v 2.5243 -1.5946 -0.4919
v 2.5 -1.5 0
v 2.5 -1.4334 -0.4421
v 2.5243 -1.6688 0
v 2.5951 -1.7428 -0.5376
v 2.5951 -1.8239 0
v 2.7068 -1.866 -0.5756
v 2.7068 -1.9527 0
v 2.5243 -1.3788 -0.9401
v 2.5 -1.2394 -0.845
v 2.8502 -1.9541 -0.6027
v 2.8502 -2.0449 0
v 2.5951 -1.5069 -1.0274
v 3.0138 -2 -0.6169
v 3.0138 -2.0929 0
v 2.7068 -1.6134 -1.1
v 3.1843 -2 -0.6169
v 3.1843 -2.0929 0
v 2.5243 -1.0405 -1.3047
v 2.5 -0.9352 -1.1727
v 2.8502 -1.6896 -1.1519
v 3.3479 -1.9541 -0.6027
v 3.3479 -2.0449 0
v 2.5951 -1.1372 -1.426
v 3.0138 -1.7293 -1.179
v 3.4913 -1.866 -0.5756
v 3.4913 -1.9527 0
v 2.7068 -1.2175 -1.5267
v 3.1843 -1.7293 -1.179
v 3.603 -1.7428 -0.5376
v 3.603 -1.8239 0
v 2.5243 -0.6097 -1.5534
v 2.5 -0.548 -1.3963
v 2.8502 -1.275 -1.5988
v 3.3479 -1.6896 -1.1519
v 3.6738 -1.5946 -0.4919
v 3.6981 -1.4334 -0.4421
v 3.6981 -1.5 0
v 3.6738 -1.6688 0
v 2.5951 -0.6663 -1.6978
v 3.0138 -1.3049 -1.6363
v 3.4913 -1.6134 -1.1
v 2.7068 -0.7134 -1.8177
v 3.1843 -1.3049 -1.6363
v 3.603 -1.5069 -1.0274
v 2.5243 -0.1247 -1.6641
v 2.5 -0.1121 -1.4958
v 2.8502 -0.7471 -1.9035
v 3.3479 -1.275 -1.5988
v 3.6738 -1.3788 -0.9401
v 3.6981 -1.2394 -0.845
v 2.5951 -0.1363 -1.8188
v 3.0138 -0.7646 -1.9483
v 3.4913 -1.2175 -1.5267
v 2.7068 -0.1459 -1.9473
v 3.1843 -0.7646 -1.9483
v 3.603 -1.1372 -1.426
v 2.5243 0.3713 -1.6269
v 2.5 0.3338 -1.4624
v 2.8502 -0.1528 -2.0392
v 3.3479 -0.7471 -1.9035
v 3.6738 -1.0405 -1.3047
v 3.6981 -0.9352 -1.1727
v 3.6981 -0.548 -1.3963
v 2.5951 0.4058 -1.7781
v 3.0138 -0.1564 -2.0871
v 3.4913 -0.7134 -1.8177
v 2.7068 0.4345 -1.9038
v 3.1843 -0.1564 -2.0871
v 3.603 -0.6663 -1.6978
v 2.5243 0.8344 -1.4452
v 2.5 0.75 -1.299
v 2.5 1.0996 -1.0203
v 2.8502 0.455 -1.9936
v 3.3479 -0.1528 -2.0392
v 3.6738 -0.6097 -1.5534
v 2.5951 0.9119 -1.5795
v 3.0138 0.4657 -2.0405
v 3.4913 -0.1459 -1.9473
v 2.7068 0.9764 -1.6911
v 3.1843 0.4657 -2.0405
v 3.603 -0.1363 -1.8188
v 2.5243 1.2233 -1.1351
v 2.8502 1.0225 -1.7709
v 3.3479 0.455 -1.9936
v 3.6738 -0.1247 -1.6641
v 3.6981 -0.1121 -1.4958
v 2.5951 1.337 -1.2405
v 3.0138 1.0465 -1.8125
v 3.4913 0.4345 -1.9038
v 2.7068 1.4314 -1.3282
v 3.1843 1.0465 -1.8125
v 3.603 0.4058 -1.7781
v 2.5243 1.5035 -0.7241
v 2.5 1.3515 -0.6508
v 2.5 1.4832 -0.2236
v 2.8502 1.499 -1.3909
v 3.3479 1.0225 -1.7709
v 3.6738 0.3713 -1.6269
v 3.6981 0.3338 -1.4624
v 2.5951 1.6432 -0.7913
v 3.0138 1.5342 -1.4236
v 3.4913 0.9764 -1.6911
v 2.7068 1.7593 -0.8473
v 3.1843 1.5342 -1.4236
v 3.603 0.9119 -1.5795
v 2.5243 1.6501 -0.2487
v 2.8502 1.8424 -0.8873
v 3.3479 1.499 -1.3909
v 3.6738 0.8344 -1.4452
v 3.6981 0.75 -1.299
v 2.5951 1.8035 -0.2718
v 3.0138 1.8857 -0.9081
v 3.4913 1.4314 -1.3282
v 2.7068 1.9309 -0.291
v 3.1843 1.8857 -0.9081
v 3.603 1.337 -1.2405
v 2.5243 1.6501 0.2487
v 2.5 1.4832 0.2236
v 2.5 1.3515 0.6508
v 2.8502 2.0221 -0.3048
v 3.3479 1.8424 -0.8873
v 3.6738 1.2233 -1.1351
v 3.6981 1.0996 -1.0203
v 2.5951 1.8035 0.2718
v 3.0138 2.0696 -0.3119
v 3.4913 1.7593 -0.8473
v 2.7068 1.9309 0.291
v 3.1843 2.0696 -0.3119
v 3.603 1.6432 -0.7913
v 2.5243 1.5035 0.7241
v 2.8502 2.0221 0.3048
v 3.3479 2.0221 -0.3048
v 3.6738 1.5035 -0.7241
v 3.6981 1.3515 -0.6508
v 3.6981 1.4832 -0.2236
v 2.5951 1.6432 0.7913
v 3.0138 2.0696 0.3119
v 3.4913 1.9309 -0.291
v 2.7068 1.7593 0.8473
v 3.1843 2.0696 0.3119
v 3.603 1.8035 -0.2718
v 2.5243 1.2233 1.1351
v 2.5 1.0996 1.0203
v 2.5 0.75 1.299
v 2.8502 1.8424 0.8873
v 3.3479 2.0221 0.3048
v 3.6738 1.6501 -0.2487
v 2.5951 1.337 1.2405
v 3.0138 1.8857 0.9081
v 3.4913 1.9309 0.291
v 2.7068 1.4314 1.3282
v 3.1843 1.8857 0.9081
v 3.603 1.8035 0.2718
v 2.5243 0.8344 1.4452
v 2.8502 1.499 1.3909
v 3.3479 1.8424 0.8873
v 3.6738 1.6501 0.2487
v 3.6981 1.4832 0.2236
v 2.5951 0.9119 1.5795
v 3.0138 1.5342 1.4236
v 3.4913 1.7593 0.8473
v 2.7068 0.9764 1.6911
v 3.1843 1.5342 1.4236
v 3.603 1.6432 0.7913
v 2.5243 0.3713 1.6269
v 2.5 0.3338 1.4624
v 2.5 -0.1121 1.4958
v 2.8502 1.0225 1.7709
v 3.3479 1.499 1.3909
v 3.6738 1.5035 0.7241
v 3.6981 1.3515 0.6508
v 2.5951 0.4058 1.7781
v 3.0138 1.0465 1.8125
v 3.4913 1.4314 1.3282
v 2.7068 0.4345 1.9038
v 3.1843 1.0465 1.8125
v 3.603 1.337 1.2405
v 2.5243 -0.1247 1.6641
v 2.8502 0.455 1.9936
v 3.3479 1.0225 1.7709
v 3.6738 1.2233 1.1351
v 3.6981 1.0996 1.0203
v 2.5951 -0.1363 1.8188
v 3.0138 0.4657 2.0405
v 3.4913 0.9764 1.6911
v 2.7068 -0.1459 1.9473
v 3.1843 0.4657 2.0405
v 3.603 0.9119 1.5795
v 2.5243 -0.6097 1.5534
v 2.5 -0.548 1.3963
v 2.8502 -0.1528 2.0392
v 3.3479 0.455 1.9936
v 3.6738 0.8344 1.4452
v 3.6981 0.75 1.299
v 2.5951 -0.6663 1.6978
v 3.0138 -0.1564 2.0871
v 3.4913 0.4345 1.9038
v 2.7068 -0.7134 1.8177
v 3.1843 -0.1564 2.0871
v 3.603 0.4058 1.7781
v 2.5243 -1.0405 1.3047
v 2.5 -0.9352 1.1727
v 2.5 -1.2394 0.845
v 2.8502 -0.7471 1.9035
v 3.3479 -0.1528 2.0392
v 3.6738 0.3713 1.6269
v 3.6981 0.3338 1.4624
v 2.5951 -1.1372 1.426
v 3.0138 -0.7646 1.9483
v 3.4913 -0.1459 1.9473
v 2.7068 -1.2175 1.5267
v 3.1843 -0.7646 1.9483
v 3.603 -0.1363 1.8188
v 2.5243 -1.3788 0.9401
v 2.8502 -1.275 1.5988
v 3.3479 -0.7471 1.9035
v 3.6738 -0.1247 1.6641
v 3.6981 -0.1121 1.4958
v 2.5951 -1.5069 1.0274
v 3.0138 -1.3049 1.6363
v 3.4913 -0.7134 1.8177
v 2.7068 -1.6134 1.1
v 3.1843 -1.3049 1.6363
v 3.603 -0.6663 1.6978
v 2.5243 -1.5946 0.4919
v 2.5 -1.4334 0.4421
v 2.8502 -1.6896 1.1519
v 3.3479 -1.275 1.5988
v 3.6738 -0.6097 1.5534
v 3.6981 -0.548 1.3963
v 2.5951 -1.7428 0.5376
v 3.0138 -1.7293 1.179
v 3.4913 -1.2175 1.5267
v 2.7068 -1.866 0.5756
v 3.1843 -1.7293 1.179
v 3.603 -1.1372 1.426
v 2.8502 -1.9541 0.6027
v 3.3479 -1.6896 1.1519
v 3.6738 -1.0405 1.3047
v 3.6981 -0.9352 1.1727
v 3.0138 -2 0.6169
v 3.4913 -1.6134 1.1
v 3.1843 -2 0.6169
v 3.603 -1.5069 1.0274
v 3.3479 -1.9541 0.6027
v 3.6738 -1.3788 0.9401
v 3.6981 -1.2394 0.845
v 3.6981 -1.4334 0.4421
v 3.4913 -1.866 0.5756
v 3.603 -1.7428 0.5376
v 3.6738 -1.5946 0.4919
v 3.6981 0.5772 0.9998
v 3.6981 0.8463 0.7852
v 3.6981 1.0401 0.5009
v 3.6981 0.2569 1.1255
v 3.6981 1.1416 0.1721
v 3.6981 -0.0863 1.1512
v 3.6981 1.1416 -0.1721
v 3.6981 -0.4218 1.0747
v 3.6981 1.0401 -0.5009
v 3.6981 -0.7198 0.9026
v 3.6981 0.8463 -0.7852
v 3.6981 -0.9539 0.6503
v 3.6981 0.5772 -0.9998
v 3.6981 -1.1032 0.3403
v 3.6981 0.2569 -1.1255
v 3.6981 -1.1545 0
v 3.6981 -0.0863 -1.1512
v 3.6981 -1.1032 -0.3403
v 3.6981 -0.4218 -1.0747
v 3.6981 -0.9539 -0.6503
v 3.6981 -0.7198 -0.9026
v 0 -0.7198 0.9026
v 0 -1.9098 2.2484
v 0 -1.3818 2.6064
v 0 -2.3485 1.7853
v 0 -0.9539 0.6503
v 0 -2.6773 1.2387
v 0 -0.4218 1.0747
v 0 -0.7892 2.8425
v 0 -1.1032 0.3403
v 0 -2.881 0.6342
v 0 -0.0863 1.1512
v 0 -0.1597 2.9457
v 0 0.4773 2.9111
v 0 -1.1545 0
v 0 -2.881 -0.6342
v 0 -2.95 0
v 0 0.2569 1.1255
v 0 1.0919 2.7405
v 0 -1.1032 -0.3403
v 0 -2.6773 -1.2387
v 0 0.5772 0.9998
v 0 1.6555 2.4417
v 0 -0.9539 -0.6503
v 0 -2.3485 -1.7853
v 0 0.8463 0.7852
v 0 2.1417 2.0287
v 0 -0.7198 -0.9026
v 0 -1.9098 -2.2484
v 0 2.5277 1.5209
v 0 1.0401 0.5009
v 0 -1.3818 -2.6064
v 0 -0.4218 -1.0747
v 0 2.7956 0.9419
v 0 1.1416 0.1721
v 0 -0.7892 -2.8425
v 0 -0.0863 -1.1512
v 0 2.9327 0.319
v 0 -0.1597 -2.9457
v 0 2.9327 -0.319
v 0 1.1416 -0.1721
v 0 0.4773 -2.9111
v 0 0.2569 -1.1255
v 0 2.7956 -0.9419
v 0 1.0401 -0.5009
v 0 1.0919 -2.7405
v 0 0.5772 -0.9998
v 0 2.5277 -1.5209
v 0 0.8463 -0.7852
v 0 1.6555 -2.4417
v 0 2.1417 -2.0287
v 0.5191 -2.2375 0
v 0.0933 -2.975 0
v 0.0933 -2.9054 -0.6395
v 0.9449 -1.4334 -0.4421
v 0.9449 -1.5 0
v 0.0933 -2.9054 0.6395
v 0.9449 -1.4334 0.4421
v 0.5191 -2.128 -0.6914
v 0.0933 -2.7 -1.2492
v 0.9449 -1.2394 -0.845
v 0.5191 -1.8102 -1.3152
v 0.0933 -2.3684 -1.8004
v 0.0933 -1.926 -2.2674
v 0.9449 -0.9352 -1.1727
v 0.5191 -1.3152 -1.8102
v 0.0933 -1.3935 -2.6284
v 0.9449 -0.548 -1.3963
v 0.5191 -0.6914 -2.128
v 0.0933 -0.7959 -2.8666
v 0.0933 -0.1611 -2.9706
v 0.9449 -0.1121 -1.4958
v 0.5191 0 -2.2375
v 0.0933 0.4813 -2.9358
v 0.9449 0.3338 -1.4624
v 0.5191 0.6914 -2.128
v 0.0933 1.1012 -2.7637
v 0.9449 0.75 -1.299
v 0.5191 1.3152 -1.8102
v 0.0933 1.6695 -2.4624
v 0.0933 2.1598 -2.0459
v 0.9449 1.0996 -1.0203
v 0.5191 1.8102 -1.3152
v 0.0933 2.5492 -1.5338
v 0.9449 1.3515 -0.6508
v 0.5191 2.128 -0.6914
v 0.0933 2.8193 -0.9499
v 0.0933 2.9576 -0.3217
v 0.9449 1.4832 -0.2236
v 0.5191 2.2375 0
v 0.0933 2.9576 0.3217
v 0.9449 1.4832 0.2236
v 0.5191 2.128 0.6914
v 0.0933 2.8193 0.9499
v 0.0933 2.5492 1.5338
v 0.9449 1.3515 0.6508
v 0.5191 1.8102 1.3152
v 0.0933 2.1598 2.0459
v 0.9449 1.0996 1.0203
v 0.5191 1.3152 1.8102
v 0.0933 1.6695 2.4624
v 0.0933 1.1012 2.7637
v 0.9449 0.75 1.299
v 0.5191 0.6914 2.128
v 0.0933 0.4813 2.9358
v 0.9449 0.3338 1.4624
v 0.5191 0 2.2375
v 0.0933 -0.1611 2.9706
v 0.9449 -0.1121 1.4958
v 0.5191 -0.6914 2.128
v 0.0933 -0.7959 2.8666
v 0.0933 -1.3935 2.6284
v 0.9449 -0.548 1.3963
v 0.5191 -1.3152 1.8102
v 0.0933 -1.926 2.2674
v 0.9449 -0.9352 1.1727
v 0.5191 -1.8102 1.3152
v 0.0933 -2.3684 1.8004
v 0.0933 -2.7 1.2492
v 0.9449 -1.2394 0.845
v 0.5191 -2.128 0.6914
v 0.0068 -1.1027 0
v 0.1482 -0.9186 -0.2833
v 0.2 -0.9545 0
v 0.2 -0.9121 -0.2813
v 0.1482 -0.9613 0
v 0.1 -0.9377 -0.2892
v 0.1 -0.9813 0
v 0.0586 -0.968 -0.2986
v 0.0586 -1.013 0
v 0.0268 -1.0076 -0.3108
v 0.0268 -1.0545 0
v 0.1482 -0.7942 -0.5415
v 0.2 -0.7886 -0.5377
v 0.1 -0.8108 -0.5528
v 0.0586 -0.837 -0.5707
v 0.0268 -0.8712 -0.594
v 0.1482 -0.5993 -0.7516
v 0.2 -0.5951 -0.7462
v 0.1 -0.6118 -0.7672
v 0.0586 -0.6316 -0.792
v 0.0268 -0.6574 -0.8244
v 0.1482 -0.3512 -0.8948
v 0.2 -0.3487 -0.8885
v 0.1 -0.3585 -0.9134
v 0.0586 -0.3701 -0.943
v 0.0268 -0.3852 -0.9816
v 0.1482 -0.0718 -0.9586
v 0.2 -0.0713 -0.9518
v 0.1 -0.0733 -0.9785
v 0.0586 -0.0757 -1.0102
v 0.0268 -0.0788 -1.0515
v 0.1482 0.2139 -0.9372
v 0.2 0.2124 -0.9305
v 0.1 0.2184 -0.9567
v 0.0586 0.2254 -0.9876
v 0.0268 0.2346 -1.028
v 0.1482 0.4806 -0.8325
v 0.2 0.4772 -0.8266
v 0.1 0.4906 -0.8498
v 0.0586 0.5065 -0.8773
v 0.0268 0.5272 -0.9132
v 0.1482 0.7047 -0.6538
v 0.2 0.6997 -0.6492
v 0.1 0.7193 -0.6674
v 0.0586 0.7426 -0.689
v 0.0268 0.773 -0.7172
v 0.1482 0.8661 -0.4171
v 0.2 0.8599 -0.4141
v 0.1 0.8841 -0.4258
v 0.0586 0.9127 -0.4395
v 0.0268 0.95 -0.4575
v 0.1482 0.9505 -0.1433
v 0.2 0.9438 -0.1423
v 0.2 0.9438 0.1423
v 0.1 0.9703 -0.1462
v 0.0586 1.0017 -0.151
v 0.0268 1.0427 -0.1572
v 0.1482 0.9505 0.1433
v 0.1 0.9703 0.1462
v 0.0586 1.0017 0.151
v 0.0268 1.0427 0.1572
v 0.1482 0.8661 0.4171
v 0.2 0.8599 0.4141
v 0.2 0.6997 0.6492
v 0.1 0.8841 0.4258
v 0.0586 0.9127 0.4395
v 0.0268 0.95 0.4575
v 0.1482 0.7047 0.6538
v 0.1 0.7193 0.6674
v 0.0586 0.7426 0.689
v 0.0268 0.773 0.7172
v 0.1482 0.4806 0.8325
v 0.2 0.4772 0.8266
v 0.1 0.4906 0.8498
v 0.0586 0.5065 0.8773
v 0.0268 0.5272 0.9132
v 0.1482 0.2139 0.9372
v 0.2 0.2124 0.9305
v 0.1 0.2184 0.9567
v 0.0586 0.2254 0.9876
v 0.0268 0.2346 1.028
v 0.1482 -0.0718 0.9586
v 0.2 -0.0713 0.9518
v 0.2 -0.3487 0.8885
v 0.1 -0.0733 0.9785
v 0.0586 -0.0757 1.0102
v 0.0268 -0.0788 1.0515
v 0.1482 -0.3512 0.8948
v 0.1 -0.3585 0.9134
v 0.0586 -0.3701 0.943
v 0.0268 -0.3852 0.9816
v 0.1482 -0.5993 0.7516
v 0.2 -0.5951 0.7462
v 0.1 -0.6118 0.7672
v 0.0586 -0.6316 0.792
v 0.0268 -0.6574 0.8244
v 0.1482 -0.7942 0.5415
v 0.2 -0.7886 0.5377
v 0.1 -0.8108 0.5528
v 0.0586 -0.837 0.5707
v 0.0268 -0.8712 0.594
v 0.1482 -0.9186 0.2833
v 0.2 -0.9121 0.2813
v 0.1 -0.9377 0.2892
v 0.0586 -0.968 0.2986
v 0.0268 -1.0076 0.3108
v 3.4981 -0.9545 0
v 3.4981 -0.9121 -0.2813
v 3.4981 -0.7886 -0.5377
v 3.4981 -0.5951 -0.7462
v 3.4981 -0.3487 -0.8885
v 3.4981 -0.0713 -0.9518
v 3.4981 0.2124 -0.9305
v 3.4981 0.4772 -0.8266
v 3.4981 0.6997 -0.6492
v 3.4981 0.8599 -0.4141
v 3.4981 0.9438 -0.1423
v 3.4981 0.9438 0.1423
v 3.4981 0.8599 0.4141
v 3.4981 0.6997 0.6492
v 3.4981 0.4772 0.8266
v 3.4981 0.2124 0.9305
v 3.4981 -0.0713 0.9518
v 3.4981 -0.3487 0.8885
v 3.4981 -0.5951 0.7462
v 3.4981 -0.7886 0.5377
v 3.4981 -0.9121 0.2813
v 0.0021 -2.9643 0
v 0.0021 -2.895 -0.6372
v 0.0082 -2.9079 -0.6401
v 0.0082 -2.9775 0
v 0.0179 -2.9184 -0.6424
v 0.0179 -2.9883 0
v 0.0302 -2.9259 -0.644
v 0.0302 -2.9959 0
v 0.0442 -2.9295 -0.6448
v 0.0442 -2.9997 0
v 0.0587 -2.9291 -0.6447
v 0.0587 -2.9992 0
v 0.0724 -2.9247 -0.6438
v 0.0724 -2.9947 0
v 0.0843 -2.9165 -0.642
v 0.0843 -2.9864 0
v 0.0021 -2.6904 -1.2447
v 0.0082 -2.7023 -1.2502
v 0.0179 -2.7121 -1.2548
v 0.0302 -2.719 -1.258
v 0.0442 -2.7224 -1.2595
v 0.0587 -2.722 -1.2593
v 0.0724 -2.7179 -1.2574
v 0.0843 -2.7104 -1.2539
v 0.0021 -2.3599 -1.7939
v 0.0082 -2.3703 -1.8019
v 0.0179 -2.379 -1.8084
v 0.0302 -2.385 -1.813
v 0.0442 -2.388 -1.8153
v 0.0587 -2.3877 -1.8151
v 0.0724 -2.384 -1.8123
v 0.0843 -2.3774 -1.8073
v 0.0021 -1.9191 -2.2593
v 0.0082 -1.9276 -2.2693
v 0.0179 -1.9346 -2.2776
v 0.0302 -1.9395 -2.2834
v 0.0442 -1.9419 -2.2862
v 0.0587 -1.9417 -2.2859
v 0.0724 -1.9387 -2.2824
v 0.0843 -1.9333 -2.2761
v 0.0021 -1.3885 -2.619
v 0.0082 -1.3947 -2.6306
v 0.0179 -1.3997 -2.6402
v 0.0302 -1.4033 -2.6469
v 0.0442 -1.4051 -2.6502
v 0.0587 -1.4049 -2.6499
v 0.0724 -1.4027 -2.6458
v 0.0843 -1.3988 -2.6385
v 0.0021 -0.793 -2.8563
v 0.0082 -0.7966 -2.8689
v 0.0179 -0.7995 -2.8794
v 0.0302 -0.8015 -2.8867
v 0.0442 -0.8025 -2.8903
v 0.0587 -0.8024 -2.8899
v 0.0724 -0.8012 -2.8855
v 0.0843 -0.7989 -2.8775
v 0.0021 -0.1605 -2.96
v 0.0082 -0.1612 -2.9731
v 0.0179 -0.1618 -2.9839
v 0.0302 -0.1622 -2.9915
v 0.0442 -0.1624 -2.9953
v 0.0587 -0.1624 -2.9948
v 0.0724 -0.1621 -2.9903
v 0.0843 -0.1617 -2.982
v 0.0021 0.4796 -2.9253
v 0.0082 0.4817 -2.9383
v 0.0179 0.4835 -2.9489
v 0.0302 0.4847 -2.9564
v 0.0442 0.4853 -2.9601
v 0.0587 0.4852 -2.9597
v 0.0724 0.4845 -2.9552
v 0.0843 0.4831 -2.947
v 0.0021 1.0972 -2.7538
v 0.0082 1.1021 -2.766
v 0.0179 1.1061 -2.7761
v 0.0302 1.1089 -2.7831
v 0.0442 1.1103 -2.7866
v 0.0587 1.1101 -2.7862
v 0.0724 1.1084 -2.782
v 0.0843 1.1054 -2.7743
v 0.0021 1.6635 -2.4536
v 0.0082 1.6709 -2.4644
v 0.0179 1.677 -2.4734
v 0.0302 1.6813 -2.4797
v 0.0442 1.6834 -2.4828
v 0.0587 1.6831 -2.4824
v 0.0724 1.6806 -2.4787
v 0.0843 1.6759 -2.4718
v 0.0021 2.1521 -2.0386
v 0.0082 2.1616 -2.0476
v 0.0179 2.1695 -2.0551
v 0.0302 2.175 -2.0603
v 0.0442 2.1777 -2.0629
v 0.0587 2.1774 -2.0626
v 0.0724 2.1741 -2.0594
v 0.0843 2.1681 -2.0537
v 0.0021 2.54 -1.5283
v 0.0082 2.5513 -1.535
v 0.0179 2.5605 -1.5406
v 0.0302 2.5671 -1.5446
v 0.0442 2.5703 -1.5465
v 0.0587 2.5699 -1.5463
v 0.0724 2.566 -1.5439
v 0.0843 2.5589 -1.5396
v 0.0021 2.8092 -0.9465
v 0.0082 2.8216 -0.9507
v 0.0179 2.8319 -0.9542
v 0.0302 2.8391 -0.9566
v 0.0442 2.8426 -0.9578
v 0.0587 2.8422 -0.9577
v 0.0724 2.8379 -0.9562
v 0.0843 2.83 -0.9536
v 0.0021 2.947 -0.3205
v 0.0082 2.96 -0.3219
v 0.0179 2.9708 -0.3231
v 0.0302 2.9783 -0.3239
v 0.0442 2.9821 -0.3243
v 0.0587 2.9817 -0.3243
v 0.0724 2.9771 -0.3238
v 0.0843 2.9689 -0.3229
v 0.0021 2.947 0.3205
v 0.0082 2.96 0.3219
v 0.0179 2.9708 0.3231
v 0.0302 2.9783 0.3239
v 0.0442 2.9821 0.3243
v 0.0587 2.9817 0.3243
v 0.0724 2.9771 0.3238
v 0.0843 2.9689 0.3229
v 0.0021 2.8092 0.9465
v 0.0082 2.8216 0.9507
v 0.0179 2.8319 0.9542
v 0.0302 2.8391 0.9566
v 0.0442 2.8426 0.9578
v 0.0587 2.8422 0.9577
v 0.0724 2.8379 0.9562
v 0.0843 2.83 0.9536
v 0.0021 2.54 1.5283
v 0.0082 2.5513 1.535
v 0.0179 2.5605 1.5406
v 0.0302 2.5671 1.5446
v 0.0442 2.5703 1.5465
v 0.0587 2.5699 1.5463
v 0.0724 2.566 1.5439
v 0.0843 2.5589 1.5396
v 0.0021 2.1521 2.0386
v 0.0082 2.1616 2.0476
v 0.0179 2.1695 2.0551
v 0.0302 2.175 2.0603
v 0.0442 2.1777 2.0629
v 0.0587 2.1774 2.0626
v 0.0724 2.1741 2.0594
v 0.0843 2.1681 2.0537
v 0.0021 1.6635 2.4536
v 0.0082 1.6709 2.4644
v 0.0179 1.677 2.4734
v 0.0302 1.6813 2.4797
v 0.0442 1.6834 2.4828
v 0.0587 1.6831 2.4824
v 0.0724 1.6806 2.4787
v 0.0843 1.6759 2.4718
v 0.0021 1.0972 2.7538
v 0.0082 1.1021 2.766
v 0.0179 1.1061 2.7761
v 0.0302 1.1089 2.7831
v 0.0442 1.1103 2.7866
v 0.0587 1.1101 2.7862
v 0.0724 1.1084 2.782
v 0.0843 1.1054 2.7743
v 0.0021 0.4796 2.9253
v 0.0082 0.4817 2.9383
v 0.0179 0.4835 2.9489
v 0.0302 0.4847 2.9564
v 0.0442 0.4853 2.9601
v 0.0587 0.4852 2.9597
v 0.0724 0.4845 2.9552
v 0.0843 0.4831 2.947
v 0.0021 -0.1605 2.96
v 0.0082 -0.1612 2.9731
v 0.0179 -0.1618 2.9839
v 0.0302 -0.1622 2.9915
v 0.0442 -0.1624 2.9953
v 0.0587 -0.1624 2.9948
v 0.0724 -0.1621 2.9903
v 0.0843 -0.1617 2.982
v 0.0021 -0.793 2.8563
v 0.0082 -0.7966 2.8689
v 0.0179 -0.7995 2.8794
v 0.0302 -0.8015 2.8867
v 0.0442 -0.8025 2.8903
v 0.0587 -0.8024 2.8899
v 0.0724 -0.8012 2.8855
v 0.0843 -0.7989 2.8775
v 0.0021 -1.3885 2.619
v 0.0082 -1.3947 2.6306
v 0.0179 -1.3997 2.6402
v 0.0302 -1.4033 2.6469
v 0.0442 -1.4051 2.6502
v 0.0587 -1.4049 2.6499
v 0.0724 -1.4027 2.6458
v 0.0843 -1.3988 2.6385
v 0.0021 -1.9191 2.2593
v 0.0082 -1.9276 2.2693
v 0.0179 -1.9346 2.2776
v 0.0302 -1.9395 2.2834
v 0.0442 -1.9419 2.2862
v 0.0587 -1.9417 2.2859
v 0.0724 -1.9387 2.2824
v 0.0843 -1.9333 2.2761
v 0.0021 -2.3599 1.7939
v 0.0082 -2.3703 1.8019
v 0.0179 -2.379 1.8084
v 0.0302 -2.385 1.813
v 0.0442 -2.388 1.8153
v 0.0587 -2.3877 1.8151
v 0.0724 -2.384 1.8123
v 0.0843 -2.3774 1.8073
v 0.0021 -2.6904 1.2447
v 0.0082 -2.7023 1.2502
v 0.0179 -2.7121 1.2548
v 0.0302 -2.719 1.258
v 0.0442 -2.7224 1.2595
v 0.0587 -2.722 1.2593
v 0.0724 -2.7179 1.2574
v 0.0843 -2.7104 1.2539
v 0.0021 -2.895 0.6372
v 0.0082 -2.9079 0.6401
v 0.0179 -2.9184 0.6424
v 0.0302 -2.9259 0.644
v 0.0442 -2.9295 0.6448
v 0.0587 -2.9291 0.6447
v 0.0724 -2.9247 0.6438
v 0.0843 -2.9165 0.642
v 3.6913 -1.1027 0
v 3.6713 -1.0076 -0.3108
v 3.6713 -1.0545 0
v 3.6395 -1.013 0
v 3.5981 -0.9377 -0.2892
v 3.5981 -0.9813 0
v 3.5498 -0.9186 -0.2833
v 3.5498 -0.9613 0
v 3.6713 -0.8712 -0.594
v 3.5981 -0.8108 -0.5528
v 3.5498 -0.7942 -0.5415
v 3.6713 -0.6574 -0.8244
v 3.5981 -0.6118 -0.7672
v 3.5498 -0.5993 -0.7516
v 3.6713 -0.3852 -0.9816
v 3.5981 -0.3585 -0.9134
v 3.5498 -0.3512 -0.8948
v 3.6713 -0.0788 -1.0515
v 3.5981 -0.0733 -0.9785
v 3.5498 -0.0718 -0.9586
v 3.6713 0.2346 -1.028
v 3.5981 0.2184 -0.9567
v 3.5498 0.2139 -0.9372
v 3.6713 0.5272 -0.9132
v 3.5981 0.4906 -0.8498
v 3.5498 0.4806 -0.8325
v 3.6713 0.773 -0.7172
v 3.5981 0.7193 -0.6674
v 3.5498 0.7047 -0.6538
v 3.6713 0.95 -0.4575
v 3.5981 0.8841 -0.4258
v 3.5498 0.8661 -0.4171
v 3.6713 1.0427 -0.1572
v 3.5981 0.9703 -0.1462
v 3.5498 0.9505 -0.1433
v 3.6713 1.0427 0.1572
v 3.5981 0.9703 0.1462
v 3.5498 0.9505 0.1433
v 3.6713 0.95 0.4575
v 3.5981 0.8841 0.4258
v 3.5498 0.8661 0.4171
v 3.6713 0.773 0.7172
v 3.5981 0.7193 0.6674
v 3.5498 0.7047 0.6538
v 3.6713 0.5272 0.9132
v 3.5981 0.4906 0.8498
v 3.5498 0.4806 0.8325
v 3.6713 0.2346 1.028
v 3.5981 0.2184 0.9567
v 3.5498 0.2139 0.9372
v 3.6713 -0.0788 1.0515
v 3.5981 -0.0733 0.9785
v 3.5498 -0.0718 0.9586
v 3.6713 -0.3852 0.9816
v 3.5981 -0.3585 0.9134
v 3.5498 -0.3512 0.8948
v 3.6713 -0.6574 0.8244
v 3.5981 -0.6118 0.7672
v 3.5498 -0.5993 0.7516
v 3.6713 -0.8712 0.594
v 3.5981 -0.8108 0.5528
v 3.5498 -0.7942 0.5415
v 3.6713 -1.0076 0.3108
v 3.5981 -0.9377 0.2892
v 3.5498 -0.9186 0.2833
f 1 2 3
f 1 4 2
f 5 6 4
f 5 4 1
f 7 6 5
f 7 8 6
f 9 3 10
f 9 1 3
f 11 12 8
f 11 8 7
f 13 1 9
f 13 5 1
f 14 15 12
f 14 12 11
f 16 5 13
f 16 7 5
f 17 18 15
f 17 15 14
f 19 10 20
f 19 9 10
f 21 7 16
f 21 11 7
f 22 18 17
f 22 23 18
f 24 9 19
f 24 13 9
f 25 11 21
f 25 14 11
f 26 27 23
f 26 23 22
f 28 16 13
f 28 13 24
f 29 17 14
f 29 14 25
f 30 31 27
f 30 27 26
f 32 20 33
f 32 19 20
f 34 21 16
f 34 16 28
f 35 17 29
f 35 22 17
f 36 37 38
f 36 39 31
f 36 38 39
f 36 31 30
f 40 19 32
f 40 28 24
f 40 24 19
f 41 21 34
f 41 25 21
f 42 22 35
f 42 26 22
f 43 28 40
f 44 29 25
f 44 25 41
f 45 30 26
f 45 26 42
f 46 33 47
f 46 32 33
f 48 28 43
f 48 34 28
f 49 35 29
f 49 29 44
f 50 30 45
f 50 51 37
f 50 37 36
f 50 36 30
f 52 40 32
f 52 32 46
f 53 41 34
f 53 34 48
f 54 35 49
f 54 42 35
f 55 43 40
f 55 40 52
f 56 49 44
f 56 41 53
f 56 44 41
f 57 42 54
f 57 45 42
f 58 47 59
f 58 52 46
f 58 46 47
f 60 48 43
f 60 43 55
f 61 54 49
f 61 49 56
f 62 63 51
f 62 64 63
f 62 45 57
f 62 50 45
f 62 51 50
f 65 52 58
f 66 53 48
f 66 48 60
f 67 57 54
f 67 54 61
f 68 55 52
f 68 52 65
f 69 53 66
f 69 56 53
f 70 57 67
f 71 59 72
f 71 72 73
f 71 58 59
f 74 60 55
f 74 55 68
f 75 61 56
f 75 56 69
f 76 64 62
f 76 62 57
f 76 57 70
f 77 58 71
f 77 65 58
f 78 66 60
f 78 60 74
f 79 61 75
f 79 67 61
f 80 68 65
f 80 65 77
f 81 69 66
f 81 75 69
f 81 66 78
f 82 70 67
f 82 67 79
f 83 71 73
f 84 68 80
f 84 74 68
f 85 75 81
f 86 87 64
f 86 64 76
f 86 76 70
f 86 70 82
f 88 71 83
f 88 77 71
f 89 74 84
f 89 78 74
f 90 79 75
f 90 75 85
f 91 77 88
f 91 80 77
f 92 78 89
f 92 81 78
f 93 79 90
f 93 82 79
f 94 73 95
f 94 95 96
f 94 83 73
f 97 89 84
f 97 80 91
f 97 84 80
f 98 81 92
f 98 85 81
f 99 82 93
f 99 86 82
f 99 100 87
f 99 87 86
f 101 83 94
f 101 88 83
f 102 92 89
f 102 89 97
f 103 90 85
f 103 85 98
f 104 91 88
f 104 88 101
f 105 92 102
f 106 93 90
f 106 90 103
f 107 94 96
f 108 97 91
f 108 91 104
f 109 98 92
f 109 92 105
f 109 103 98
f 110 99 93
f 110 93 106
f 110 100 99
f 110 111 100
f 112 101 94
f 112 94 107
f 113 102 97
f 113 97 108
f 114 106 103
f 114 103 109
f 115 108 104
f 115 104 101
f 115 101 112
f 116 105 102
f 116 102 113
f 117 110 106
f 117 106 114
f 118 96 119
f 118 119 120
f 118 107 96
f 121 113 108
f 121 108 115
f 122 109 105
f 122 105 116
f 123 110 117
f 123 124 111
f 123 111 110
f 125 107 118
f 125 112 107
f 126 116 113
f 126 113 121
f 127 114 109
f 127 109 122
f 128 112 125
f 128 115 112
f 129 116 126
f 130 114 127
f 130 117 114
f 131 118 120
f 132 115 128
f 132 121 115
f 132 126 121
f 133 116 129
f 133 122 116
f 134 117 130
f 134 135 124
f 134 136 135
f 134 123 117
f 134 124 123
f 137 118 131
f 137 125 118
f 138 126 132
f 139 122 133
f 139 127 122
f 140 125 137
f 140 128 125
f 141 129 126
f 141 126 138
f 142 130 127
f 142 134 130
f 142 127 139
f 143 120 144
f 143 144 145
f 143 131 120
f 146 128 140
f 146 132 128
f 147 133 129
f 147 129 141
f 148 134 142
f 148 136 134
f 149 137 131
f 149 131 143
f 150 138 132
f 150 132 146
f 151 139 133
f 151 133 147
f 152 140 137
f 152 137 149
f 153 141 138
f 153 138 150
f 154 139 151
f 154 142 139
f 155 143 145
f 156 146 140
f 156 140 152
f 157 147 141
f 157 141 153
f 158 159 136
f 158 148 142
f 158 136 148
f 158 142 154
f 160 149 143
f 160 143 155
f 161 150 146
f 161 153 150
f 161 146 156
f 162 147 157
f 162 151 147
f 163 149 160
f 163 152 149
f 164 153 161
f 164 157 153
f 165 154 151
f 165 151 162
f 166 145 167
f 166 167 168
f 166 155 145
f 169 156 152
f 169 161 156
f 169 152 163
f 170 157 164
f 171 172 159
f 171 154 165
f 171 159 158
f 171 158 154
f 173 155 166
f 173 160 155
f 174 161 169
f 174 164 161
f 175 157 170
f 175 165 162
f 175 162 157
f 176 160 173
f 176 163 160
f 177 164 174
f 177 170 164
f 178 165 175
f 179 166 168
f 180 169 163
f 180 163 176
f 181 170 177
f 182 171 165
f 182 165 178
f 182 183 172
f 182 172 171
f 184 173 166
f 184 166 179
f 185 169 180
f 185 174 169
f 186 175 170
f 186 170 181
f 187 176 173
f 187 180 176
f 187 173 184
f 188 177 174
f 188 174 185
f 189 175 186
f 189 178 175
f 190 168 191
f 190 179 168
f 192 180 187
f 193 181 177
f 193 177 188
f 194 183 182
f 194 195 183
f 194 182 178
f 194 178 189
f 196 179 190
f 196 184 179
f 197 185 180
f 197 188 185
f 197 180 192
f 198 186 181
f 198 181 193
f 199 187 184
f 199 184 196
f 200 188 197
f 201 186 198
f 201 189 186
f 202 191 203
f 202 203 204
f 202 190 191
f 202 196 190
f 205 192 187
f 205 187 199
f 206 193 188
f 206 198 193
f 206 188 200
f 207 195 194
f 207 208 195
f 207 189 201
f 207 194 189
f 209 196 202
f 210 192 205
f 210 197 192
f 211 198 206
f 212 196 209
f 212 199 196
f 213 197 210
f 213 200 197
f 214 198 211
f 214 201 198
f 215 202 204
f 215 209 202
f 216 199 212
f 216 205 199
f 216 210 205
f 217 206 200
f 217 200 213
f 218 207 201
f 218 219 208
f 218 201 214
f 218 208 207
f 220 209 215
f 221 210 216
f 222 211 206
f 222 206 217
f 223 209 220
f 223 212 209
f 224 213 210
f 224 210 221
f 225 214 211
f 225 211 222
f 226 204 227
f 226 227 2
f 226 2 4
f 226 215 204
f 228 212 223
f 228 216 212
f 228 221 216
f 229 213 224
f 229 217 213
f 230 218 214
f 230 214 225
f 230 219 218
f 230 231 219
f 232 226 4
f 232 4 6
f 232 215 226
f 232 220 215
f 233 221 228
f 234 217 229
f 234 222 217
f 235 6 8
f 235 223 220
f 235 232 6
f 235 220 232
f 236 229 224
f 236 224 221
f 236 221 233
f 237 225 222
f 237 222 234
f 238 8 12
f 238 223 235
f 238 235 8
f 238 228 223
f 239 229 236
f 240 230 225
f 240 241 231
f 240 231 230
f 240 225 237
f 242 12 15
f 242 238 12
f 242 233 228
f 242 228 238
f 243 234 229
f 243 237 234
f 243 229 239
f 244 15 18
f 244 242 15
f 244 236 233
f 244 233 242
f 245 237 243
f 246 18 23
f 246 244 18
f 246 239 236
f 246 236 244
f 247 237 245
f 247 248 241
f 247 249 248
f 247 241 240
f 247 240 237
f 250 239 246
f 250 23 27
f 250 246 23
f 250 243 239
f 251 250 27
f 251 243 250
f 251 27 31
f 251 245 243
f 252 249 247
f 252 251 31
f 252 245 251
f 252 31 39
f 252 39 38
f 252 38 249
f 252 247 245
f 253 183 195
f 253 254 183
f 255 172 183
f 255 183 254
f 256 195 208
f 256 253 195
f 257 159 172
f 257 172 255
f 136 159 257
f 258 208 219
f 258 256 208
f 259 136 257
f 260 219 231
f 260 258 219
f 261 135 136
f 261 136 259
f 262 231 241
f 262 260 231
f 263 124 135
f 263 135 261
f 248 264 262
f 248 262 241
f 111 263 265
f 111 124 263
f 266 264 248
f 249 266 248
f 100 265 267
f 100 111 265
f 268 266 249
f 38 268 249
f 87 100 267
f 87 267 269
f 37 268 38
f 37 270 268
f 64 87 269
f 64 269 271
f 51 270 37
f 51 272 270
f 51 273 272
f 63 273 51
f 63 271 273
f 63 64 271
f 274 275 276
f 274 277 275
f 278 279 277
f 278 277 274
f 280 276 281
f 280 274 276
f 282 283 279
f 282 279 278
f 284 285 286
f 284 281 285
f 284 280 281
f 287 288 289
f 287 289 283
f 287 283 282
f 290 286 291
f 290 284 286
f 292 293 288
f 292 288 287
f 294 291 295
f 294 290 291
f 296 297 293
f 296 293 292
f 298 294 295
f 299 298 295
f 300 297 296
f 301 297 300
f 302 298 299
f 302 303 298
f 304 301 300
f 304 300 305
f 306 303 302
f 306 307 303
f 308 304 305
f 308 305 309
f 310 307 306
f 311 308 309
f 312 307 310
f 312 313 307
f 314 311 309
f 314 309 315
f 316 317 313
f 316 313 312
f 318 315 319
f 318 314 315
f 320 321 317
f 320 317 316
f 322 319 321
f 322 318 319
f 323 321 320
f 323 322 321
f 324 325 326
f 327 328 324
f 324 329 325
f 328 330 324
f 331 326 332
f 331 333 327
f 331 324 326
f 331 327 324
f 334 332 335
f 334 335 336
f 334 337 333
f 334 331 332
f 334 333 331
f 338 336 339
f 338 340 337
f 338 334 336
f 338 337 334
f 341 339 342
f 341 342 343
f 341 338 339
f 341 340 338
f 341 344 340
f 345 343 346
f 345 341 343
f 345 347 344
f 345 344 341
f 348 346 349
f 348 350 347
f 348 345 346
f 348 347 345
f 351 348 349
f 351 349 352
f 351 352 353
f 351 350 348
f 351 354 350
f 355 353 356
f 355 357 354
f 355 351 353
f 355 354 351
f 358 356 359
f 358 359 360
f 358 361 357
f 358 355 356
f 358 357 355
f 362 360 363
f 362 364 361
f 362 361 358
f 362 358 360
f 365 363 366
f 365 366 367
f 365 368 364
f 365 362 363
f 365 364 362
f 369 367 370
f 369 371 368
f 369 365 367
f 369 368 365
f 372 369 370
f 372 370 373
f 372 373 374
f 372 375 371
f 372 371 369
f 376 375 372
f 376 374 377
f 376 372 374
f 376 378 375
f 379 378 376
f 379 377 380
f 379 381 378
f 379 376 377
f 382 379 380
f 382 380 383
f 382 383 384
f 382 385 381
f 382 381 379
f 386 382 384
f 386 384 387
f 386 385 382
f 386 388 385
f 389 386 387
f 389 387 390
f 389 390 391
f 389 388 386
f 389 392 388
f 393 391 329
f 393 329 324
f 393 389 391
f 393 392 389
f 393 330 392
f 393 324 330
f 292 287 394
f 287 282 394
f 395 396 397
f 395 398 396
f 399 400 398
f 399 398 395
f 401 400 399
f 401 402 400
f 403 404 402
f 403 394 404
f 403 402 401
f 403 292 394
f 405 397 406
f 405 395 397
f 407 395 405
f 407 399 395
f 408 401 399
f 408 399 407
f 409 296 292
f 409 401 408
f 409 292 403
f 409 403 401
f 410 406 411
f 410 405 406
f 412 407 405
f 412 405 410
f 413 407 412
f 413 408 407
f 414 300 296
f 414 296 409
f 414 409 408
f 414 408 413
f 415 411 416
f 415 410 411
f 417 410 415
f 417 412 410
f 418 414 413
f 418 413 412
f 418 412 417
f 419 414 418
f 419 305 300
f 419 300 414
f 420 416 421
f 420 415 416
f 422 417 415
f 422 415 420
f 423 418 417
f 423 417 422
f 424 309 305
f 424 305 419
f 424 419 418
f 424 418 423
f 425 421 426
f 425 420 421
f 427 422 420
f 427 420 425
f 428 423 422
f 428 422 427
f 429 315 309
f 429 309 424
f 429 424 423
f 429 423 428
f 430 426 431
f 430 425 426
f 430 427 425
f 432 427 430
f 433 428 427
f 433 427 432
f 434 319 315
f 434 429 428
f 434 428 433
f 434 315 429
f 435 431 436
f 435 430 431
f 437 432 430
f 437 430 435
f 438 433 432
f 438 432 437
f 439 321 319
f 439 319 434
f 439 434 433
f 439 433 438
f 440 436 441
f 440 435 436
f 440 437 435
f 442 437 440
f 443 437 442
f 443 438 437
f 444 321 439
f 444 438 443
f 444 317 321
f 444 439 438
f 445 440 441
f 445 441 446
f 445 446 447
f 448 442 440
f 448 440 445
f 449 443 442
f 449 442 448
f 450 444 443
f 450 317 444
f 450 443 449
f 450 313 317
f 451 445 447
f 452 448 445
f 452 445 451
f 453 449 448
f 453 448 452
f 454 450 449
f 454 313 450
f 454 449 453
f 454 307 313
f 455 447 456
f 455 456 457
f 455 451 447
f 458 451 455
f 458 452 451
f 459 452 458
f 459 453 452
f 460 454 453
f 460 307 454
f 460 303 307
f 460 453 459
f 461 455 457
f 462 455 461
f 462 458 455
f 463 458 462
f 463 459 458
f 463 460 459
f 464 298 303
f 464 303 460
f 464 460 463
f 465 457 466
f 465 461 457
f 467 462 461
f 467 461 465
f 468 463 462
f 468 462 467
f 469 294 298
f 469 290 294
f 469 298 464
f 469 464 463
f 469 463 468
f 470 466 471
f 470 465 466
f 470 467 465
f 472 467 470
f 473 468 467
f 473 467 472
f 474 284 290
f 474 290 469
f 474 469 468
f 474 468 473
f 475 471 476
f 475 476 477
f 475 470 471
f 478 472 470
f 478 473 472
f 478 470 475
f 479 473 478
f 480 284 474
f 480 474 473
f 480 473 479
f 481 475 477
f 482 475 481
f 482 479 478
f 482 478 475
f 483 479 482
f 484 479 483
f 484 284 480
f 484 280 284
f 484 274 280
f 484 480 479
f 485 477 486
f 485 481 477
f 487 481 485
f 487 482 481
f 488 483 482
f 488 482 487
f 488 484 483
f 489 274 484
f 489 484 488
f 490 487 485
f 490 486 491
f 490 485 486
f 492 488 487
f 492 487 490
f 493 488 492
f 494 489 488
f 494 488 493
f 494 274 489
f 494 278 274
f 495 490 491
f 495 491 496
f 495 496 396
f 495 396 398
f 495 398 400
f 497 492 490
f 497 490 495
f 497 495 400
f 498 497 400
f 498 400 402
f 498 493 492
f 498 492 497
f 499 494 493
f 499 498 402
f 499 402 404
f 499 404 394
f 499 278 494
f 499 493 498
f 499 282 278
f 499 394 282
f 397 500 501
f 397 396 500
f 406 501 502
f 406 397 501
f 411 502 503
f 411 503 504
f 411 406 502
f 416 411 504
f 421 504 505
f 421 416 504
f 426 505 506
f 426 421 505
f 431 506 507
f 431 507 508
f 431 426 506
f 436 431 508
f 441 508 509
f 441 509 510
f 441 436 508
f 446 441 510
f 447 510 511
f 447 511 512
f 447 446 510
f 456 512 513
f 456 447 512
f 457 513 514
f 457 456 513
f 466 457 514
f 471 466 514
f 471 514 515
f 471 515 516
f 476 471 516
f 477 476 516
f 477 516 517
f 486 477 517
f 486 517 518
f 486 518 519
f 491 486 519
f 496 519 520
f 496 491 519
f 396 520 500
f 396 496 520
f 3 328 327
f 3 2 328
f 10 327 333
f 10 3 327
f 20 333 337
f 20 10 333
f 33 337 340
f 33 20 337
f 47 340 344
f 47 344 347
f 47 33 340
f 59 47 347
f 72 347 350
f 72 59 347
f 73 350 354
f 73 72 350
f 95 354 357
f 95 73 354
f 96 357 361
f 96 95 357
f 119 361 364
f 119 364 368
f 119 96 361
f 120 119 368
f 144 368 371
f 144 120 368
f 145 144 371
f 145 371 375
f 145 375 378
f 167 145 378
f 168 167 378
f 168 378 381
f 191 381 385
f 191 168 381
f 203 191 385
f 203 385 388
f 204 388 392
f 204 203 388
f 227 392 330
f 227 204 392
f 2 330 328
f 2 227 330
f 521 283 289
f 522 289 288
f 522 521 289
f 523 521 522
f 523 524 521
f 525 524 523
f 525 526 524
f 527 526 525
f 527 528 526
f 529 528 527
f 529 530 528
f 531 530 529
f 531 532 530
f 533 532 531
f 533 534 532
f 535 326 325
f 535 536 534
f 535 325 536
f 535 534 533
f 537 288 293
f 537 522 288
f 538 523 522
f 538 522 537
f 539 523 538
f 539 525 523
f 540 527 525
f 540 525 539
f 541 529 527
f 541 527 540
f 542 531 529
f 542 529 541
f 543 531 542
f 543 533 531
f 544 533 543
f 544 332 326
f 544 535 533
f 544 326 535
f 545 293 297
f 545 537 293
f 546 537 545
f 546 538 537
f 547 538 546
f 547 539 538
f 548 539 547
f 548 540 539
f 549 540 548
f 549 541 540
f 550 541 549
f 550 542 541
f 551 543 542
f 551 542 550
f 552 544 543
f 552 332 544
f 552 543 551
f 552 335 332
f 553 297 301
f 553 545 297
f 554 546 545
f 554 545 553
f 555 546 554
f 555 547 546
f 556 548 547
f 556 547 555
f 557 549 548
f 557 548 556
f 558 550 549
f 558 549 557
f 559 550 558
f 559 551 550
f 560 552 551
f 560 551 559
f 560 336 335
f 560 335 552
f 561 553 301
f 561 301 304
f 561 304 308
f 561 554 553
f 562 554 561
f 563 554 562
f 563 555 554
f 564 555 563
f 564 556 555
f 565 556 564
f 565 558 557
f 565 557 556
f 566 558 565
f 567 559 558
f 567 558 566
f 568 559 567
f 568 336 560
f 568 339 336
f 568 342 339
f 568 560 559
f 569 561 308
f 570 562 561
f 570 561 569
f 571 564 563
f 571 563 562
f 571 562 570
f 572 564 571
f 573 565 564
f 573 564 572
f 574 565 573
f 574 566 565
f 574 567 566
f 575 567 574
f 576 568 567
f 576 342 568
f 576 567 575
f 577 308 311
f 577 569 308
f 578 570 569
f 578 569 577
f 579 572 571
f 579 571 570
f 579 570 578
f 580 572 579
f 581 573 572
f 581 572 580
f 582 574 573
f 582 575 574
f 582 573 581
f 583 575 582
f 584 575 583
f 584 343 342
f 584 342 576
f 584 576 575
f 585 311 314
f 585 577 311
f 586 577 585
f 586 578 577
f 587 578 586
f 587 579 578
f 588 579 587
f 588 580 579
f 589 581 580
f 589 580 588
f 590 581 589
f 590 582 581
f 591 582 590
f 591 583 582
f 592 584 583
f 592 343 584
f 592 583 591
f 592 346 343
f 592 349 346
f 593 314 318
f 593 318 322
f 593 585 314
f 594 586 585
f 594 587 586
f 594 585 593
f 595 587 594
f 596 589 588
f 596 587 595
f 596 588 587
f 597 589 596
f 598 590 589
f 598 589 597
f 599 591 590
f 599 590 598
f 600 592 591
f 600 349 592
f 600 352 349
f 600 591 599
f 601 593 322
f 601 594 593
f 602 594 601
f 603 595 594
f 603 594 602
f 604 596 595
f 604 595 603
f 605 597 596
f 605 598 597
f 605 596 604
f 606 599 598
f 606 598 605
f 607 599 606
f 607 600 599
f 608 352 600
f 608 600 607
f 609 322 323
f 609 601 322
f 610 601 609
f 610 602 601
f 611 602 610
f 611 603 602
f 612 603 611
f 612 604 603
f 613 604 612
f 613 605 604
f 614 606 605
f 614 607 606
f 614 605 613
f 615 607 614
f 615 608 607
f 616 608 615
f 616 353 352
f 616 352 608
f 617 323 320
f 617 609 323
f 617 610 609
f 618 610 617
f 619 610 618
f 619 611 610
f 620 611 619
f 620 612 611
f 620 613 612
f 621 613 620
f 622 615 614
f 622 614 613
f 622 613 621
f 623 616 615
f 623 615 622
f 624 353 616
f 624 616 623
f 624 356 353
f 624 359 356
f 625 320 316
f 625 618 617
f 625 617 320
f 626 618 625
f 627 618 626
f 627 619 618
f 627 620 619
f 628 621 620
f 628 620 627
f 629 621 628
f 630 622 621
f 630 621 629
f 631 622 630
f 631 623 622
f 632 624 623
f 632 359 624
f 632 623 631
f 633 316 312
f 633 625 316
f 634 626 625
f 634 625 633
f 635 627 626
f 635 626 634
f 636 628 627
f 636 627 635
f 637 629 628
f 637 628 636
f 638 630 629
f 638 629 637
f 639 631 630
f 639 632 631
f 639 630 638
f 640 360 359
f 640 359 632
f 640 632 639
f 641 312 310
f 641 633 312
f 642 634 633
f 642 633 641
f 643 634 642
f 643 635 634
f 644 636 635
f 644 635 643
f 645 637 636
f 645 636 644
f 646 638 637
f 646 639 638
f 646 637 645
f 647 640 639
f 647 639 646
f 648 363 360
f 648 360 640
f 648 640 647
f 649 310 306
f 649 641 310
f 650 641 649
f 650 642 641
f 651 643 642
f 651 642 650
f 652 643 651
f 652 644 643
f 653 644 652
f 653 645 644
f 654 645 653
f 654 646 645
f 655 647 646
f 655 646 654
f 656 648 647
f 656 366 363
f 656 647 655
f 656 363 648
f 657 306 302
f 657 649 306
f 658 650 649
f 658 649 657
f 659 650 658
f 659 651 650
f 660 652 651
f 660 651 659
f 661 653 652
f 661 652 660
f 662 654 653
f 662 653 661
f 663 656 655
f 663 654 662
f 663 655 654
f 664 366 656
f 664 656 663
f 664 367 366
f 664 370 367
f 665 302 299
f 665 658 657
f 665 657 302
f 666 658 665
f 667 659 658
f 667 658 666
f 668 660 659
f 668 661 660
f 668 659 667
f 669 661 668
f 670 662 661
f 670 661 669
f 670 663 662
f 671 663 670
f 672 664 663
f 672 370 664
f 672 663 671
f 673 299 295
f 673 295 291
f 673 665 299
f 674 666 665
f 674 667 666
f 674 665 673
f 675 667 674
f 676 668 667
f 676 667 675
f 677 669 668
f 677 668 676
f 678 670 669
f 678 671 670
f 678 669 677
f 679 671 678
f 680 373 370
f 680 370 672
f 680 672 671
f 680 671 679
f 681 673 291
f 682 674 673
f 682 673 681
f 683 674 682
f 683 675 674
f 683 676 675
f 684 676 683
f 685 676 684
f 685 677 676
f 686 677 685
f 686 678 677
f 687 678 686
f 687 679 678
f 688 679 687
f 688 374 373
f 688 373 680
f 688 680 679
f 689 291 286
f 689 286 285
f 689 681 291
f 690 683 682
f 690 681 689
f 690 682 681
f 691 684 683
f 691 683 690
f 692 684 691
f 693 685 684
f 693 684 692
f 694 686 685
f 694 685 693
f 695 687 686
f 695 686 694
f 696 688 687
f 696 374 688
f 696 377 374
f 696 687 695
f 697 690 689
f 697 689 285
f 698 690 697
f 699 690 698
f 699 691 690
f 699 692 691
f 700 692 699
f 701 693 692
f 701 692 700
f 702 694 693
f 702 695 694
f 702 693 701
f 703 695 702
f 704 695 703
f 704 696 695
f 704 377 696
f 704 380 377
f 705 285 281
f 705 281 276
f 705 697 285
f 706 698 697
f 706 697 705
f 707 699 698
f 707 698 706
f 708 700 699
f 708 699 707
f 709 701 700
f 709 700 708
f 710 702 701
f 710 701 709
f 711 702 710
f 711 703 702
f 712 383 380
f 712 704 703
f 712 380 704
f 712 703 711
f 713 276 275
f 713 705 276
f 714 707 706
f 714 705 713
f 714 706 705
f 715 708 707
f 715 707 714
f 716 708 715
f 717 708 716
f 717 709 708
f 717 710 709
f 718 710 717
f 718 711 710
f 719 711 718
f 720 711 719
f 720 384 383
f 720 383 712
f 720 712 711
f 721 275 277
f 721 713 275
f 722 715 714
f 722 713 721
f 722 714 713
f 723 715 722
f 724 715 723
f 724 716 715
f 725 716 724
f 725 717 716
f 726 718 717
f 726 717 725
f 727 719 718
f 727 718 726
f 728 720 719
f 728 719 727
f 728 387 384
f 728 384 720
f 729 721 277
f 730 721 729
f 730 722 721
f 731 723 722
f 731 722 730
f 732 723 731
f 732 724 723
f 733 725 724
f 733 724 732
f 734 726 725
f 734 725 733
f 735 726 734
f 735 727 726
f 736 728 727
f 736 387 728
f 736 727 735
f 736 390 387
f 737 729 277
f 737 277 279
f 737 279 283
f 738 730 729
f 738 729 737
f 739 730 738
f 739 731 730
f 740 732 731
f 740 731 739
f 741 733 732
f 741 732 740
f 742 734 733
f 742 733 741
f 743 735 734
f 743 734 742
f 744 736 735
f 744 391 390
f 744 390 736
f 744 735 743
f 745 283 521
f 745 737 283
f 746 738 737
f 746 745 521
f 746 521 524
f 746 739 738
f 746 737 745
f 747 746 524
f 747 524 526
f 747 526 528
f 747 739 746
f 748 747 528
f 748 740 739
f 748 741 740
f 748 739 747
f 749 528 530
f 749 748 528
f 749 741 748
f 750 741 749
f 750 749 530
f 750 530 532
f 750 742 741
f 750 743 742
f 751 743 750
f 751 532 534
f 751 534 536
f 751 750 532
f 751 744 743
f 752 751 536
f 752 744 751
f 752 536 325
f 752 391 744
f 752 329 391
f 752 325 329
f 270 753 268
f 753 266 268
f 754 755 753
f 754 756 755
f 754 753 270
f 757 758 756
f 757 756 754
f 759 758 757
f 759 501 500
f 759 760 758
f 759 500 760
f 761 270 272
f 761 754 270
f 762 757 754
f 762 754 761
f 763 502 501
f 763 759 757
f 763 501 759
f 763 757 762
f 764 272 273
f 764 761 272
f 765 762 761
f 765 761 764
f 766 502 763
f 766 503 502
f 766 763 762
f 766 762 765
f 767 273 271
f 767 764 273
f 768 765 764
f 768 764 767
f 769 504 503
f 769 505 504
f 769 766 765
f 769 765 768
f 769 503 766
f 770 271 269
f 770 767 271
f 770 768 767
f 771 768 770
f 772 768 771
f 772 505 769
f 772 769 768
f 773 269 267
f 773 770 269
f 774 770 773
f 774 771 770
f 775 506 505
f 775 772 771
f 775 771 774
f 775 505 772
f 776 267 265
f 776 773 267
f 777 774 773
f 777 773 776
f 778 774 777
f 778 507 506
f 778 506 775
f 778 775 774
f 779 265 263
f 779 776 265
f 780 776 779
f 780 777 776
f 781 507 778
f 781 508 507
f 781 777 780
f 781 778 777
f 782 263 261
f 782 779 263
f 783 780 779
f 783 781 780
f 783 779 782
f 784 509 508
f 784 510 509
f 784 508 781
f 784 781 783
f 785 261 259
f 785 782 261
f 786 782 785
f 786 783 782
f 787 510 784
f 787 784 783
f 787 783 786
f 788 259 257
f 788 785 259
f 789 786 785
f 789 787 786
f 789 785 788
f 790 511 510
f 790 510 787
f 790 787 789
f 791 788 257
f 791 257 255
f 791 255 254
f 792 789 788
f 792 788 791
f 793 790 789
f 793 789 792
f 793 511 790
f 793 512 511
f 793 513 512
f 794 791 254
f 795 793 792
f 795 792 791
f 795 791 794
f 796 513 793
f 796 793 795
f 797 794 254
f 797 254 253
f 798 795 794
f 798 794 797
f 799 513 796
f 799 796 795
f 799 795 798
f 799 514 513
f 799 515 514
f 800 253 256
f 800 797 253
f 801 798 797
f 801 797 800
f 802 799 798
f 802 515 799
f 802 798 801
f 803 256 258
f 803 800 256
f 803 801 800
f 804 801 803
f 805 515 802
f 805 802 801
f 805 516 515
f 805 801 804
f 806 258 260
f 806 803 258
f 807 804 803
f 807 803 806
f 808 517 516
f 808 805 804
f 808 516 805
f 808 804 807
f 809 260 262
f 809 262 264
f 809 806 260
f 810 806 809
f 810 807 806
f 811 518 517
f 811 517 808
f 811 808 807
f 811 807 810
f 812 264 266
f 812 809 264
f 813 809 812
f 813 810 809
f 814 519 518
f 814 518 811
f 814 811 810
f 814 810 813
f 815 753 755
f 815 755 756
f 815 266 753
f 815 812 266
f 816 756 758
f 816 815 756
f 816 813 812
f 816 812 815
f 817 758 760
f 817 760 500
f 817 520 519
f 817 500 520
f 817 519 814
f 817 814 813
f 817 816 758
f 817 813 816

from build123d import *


with BuildPart() as part:
    # Эскиз2 → Повернуть1 (revolve)
    with BuildSketch(Plane.XY):
        with BuildLine():
            Line((3.498076211, -0.95446582), (0.2, -0.95446582))
            ThreePointArc((0.2, -0.95446582), (0.058578644, -1.013044464), (0, -1.15446582))
            Line((0, -1.15446582), (0, -2.95))
            ThreePointArc((0, -2.95), (0.037059048, -2.998296291), (0.09330127, -2.975))
            Line((0.09330127, -2.975), (0.944892917, -1.5))
            Line((0.944892917, -1.5), (2.5, -1.5))
            ThreePointArc((2.5, -1.5), (3.099038106, -2.099038106), (3.698076211, -1.5))
            Line((3.698076211, -1.5), (3.698076211, -1.15446582))
            ThreePointArc((3.698076211, -1.15446582), (3.639497568, -1.013044464), (3.498076211, -0.95446582))
        make_face()
    revolve(axis=Axis((0, 0, 0), (1, 0, 0)))


solid = part.part
